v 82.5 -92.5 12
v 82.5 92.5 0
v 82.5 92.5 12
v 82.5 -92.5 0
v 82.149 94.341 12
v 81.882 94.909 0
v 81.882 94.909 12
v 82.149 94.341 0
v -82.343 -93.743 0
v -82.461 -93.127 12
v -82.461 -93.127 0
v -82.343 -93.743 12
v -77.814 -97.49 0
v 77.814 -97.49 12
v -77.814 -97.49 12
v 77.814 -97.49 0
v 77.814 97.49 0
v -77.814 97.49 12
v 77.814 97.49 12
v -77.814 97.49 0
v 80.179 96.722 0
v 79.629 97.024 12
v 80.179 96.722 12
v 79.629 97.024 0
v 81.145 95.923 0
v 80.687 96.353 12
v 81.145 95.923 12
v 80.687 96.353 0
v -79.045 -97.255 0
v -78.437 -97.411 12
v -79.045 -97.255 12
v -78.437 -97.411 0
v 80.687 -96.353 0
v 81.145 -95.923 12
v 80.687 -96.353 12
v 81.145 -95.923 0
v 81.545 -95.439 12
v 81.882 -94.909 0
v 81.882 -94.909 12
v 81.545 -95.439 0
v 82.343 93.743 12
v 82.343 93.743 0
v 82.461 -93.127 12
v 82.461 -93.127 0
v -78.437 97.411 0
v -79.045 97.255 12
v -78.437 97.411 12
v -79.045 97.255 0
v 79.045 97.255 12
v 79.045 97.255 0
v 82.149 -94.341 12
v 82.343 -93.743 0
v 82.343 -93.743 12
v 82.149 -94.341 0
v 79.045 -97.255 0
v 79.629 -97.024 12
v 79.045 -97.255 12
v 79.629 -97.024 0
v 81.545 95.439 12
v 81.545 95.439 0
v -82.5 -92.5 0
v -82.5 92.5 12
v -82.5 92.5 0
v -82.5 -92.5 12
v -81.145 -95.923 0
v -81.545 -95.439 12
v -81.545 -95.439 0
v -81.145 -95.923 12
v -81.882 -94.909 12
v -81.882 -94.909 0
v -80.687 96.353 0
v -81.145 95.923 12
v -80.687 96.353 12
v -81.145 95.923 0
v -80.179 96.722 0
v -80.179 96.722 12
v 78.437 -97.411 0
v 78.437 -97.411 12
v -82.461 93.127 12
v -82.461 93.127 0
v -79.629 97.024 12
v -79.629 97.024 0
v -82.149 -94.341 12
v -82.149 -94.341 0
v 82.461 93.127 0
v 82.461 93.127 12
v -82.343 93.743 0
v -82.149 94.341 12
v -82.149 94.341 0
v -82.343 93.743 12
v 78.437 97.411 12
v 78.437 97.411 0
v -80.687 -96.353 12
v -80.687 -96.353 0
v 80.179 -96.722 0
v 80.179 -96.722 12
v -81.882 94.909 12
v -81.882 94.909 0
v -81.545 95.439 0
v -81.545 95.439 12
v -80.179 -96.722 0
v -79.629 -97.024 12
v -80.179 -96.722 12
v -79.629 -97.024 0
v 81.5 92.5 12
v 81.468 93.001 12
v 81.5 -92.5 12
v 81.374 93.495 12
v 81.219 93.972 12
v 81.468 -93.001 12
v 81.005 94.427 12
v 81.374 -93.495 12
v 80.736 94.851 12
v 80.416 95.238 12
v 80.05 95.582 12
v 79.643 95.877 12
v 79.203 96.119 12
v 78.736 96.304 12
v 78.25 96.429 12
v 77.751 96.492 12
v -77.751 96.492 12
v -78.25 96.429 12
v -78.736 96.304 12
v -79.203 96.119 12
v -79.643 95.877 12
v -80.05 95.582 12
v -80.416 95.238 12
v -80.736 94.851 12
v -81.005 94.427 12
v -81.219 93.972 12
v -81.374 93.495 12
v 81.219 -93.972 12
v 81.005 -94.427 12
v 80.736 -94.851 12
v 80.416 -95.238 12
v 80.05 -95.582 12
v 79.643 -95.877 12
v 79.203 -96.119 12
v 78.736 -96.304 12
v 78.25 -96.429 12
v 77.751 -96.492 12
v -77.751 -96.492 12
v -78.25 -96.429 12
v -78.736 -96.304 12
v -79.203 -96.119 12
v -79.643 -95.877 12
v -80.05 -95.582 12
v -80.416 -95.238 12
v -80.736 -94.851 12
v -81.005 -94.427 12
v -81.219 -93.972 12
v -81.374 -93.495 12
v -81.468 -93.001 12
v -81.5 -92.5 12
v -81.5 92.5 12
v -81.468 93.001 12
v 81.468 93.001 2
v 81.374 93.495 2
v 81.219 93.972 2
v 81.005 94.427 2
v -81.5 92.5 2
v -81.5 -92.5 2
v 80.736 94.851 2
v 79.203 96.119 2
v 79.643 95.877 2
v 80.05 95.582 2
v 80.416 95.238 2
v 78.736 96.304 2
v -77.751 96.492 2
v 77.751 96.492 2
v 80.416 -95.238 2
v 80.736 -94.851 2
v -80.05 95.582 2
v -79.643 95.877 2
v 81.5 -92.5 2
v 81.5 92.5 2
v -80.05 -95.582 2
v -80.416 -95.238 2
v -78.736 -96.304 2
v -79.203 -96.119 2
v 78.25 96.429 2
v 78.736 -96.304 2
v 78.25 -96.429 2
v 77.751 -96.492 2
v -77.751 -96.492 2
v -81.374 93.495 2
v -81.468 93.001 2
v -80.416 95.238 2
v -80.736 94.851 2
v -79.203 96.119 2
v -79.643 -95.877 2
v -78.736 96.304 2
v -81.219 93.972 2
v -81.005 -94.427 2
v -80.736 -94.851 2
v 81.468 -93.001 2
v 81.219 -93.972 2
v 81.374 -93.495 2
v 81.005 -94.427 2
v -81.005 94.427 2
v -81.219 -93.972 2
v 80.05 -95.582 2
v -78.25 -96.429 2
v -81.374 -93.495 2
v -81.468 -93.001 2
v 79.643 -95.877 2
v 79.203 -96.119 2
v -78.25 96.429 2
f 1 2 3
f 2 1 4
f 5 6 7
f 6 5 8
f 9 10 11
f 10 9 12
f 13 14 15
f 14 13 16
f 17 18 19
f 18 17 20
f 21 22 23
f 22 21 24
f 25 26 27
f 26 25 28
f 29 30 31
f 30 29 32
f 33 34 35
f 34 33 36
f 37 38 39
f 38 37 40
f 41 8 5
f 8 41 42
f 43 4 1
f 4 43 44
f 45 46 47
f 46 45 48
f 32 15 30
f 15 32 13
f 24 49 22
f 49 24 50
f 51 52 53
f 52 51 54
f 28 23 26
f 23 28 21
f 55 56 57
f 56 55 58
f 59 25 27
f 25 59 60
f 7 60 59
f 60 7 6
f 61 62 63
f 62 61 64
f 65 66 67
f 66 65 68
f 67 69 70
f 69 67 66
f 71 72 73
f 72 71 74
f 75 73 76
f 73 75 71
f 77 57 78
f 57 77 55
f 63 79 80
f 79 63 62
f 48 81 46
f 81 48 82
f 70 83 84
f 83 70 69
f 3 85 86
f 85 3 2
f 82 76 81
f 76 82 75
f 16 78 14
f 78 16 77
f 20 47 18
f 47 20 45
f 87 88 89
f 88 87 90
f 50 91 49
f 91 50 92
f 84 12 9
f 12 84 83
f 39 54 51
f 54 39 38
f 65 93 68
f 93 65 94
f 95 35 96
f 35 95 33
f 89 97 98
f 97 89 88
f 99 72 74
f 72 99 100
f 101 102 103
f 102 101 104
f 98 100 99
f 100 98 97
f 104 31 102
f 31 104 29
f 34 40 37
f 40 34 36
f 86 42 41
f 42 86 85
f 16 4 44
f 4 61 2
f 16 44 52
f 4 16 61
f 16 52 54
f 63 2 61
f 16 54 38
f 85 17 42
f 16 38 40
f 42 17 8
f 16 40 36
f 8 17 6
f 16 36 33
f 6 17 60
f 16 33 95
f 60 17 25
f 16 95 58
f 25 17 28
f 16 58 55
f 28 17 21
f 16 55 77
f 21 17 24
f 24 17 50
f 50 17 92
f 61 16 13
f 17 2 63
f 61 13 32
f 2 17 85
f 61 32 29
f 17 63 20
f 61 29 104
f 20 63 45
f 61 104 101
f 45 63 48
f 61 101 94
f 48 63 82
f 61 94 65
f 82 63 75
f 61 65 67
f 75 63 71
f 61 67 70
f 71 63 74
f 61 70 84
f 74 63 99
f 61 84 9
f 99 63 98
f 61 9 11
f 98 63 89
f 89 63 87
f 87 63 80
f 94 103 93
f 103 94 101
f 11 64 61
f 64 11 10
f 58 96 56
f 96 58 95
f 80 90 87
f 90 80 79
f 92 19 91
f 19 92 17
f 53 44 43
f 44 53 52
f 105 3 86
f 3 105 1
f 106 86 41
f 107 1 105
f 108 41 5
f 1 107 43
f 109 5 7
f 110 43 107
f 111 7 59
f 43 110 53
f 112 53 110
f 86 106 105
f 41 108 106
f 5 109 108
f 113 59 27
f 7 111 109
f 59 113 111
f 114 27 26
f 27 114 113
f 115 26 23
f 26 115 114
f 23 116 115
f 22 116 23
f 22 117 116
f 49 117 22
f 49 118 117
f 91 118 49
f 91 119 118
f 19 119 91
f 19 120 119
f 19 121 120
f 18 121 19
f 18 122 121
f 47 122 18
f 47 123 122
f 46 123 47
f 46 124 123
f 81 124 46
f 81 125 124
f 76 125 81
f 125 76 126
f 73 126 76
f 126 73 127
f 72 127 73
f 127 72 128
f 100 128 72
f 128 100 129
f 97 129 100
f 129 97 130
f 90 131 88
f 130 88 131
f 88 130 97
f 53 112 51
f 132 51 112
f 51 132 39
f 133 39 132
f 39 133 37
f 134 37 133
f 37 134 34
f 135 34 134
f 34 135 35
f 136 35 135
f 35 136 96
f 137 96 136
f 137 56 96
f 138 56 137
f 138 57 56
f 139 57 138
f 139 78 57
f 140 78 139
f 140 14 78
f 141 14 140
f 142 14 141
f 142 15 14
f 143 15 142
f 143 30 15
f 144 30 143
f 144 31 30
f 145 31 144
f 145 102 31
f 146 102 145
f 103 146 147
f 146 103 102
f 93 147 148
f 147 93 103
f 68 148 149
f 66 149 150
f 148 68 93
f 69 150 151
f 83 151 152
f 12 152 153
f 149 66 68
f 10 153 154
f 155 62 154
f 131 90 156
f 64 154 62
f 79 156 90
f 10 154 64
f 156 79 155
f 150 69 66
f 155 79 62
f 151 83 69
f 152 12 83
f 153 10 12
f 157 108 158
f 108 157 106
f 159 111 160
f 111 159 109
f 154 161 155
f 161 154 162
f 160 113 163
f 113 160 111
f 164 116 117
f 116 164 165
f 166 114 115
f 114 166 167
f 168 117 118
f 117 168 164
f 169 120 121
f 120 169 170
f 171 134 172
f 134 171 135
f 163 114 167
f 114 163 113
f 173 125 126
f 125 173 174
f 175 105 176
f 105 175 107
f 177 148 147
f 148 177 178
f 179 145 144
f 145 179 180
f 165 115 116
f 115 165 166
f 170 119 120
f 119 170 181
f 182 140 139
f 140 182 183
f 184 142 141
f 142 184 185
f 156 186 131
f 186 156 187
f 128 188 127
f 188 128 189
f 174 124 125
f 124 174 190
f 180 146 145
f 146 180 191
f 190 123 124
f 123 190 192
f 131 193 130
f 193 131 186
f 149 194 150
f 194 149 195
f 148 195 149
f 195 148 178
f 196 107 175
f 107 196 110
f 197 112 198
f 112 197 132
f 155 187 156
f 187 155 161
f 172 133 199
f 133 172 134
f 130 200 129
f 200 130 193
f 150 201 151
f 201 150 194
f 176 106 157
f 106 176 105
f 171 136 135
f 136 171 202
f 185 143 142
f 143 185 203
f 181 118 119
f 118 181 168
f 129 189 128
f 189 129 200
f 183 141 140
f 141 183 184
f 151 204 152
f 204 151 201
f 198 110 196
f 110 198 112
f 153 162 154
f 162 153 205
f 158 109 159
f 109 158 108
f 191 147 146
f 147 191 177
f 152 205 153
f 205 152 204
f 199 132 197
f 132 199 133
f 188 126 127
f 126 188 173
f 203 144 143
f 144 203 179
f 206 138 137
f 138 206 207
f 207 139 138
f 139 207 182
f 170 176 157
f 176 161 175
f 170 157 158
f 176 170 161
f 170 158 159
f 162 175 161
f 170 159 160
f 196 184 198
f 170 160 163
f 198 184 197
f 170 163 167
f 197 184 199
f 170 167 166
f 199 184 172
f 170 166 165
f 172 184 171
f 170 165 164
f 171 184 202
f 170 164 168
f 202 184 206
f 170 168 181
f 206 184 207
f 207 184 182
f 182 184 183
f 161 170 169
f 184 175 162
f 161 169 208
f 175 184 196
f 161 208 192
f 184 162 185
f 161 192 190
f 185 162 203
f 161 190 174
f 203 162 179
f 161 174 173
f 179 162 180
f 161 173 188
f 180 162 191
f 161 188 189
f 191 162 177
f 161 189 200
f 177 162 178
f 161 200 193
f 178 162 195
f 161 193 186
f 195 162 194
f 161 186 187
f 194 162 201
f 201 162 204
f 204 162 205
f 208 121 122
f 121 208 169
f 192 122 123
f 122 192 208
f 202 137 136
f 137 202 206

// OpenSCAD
$fn = 50;


difference() {
	union() {
		hull() {
			translate(v = [-77.5000000000, 92.5000000000, 0]) {
				cylinder(h = 12, r = 5);
			}
			translate(v = [77.5000000000, 92.5000000000, 0]) {
				cylinder(h = 12, r = 5);
			}
			translate(v = [-77.5000000000, -92.5000000000, 0]) {
				cylinder(h = 12, r = 5);
			}
			translate(v = [77.5000000000, -92.5000000000, 0]) {
				cylinder(h = 12, r = 5);
			}
		}
	}
	union() {
		translate(v = [0, 0, 2]) {
			hull() {
				translate(v = [-77.5000000000, 92.5000000000, 0]) {
					cylinder(h = 10, r = 4);
				}
				translate(v = [77.5000000000, 92.5000000000, 0]) {
					cylinder(h = 10, r = 4);
				}
				translate(v = [-77.5000000000, -92.5000000000, 0]) {
					cylinder(h = 10, r = 4);
				}
				translate(v = [77.5000000000, -92.5000000000, 0]) {
					cylinder(h = 10, r = 4);
				}
			}
		}
	}
}
